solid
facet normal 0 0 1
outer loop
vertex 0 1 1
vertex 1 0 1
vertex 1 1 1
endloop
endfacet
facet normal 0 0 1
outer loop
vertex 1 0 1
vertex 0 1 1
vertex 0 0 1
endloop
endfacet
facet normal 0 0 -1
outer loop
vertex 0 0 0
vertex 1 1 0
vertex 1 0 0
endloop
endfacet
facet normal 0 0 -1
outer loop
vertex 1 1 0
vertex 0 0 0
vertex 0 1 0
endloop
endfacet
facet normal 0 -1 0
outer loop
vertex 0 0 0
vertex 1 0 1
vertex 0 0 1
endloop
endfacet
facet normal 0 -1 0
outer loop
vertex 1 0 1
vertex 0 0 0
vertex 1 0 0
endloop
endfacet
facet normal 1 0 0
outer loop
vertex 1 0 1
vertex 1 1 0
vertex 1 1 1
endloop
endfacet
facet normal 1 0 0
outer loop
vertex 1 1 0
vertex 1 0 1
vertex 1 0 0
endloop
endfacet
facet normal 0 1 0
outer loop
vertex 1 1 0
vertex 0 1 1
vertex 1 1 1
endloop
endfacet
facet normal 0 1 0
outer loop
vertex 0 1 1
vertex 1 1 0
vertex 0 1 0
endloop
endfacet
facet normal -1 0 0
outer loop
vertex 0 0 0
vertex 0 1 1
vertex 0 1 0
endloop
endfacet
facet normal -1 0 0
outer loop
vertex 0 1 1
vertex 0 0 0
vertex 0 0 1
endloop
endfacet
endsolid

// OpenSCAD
// Variable which will be treated as `number`
x = 1;

// Variable which will be treated as `string`
y = "a";

// Variable which will be treated as `boolean`
z = true;

// Variable which will be treated as `number[]`
xxx = [1, 2, 3];

// Variable which will be treated as `string[]`
yyy = ["a", "b", "c"];

// Variable which will be treated as `boolean[]`
zzz = [true, false, true];


cube();

echo(x);
echo(y);
echo(z);

echo(xxx);
echo(yyy);
echo(zzz);
